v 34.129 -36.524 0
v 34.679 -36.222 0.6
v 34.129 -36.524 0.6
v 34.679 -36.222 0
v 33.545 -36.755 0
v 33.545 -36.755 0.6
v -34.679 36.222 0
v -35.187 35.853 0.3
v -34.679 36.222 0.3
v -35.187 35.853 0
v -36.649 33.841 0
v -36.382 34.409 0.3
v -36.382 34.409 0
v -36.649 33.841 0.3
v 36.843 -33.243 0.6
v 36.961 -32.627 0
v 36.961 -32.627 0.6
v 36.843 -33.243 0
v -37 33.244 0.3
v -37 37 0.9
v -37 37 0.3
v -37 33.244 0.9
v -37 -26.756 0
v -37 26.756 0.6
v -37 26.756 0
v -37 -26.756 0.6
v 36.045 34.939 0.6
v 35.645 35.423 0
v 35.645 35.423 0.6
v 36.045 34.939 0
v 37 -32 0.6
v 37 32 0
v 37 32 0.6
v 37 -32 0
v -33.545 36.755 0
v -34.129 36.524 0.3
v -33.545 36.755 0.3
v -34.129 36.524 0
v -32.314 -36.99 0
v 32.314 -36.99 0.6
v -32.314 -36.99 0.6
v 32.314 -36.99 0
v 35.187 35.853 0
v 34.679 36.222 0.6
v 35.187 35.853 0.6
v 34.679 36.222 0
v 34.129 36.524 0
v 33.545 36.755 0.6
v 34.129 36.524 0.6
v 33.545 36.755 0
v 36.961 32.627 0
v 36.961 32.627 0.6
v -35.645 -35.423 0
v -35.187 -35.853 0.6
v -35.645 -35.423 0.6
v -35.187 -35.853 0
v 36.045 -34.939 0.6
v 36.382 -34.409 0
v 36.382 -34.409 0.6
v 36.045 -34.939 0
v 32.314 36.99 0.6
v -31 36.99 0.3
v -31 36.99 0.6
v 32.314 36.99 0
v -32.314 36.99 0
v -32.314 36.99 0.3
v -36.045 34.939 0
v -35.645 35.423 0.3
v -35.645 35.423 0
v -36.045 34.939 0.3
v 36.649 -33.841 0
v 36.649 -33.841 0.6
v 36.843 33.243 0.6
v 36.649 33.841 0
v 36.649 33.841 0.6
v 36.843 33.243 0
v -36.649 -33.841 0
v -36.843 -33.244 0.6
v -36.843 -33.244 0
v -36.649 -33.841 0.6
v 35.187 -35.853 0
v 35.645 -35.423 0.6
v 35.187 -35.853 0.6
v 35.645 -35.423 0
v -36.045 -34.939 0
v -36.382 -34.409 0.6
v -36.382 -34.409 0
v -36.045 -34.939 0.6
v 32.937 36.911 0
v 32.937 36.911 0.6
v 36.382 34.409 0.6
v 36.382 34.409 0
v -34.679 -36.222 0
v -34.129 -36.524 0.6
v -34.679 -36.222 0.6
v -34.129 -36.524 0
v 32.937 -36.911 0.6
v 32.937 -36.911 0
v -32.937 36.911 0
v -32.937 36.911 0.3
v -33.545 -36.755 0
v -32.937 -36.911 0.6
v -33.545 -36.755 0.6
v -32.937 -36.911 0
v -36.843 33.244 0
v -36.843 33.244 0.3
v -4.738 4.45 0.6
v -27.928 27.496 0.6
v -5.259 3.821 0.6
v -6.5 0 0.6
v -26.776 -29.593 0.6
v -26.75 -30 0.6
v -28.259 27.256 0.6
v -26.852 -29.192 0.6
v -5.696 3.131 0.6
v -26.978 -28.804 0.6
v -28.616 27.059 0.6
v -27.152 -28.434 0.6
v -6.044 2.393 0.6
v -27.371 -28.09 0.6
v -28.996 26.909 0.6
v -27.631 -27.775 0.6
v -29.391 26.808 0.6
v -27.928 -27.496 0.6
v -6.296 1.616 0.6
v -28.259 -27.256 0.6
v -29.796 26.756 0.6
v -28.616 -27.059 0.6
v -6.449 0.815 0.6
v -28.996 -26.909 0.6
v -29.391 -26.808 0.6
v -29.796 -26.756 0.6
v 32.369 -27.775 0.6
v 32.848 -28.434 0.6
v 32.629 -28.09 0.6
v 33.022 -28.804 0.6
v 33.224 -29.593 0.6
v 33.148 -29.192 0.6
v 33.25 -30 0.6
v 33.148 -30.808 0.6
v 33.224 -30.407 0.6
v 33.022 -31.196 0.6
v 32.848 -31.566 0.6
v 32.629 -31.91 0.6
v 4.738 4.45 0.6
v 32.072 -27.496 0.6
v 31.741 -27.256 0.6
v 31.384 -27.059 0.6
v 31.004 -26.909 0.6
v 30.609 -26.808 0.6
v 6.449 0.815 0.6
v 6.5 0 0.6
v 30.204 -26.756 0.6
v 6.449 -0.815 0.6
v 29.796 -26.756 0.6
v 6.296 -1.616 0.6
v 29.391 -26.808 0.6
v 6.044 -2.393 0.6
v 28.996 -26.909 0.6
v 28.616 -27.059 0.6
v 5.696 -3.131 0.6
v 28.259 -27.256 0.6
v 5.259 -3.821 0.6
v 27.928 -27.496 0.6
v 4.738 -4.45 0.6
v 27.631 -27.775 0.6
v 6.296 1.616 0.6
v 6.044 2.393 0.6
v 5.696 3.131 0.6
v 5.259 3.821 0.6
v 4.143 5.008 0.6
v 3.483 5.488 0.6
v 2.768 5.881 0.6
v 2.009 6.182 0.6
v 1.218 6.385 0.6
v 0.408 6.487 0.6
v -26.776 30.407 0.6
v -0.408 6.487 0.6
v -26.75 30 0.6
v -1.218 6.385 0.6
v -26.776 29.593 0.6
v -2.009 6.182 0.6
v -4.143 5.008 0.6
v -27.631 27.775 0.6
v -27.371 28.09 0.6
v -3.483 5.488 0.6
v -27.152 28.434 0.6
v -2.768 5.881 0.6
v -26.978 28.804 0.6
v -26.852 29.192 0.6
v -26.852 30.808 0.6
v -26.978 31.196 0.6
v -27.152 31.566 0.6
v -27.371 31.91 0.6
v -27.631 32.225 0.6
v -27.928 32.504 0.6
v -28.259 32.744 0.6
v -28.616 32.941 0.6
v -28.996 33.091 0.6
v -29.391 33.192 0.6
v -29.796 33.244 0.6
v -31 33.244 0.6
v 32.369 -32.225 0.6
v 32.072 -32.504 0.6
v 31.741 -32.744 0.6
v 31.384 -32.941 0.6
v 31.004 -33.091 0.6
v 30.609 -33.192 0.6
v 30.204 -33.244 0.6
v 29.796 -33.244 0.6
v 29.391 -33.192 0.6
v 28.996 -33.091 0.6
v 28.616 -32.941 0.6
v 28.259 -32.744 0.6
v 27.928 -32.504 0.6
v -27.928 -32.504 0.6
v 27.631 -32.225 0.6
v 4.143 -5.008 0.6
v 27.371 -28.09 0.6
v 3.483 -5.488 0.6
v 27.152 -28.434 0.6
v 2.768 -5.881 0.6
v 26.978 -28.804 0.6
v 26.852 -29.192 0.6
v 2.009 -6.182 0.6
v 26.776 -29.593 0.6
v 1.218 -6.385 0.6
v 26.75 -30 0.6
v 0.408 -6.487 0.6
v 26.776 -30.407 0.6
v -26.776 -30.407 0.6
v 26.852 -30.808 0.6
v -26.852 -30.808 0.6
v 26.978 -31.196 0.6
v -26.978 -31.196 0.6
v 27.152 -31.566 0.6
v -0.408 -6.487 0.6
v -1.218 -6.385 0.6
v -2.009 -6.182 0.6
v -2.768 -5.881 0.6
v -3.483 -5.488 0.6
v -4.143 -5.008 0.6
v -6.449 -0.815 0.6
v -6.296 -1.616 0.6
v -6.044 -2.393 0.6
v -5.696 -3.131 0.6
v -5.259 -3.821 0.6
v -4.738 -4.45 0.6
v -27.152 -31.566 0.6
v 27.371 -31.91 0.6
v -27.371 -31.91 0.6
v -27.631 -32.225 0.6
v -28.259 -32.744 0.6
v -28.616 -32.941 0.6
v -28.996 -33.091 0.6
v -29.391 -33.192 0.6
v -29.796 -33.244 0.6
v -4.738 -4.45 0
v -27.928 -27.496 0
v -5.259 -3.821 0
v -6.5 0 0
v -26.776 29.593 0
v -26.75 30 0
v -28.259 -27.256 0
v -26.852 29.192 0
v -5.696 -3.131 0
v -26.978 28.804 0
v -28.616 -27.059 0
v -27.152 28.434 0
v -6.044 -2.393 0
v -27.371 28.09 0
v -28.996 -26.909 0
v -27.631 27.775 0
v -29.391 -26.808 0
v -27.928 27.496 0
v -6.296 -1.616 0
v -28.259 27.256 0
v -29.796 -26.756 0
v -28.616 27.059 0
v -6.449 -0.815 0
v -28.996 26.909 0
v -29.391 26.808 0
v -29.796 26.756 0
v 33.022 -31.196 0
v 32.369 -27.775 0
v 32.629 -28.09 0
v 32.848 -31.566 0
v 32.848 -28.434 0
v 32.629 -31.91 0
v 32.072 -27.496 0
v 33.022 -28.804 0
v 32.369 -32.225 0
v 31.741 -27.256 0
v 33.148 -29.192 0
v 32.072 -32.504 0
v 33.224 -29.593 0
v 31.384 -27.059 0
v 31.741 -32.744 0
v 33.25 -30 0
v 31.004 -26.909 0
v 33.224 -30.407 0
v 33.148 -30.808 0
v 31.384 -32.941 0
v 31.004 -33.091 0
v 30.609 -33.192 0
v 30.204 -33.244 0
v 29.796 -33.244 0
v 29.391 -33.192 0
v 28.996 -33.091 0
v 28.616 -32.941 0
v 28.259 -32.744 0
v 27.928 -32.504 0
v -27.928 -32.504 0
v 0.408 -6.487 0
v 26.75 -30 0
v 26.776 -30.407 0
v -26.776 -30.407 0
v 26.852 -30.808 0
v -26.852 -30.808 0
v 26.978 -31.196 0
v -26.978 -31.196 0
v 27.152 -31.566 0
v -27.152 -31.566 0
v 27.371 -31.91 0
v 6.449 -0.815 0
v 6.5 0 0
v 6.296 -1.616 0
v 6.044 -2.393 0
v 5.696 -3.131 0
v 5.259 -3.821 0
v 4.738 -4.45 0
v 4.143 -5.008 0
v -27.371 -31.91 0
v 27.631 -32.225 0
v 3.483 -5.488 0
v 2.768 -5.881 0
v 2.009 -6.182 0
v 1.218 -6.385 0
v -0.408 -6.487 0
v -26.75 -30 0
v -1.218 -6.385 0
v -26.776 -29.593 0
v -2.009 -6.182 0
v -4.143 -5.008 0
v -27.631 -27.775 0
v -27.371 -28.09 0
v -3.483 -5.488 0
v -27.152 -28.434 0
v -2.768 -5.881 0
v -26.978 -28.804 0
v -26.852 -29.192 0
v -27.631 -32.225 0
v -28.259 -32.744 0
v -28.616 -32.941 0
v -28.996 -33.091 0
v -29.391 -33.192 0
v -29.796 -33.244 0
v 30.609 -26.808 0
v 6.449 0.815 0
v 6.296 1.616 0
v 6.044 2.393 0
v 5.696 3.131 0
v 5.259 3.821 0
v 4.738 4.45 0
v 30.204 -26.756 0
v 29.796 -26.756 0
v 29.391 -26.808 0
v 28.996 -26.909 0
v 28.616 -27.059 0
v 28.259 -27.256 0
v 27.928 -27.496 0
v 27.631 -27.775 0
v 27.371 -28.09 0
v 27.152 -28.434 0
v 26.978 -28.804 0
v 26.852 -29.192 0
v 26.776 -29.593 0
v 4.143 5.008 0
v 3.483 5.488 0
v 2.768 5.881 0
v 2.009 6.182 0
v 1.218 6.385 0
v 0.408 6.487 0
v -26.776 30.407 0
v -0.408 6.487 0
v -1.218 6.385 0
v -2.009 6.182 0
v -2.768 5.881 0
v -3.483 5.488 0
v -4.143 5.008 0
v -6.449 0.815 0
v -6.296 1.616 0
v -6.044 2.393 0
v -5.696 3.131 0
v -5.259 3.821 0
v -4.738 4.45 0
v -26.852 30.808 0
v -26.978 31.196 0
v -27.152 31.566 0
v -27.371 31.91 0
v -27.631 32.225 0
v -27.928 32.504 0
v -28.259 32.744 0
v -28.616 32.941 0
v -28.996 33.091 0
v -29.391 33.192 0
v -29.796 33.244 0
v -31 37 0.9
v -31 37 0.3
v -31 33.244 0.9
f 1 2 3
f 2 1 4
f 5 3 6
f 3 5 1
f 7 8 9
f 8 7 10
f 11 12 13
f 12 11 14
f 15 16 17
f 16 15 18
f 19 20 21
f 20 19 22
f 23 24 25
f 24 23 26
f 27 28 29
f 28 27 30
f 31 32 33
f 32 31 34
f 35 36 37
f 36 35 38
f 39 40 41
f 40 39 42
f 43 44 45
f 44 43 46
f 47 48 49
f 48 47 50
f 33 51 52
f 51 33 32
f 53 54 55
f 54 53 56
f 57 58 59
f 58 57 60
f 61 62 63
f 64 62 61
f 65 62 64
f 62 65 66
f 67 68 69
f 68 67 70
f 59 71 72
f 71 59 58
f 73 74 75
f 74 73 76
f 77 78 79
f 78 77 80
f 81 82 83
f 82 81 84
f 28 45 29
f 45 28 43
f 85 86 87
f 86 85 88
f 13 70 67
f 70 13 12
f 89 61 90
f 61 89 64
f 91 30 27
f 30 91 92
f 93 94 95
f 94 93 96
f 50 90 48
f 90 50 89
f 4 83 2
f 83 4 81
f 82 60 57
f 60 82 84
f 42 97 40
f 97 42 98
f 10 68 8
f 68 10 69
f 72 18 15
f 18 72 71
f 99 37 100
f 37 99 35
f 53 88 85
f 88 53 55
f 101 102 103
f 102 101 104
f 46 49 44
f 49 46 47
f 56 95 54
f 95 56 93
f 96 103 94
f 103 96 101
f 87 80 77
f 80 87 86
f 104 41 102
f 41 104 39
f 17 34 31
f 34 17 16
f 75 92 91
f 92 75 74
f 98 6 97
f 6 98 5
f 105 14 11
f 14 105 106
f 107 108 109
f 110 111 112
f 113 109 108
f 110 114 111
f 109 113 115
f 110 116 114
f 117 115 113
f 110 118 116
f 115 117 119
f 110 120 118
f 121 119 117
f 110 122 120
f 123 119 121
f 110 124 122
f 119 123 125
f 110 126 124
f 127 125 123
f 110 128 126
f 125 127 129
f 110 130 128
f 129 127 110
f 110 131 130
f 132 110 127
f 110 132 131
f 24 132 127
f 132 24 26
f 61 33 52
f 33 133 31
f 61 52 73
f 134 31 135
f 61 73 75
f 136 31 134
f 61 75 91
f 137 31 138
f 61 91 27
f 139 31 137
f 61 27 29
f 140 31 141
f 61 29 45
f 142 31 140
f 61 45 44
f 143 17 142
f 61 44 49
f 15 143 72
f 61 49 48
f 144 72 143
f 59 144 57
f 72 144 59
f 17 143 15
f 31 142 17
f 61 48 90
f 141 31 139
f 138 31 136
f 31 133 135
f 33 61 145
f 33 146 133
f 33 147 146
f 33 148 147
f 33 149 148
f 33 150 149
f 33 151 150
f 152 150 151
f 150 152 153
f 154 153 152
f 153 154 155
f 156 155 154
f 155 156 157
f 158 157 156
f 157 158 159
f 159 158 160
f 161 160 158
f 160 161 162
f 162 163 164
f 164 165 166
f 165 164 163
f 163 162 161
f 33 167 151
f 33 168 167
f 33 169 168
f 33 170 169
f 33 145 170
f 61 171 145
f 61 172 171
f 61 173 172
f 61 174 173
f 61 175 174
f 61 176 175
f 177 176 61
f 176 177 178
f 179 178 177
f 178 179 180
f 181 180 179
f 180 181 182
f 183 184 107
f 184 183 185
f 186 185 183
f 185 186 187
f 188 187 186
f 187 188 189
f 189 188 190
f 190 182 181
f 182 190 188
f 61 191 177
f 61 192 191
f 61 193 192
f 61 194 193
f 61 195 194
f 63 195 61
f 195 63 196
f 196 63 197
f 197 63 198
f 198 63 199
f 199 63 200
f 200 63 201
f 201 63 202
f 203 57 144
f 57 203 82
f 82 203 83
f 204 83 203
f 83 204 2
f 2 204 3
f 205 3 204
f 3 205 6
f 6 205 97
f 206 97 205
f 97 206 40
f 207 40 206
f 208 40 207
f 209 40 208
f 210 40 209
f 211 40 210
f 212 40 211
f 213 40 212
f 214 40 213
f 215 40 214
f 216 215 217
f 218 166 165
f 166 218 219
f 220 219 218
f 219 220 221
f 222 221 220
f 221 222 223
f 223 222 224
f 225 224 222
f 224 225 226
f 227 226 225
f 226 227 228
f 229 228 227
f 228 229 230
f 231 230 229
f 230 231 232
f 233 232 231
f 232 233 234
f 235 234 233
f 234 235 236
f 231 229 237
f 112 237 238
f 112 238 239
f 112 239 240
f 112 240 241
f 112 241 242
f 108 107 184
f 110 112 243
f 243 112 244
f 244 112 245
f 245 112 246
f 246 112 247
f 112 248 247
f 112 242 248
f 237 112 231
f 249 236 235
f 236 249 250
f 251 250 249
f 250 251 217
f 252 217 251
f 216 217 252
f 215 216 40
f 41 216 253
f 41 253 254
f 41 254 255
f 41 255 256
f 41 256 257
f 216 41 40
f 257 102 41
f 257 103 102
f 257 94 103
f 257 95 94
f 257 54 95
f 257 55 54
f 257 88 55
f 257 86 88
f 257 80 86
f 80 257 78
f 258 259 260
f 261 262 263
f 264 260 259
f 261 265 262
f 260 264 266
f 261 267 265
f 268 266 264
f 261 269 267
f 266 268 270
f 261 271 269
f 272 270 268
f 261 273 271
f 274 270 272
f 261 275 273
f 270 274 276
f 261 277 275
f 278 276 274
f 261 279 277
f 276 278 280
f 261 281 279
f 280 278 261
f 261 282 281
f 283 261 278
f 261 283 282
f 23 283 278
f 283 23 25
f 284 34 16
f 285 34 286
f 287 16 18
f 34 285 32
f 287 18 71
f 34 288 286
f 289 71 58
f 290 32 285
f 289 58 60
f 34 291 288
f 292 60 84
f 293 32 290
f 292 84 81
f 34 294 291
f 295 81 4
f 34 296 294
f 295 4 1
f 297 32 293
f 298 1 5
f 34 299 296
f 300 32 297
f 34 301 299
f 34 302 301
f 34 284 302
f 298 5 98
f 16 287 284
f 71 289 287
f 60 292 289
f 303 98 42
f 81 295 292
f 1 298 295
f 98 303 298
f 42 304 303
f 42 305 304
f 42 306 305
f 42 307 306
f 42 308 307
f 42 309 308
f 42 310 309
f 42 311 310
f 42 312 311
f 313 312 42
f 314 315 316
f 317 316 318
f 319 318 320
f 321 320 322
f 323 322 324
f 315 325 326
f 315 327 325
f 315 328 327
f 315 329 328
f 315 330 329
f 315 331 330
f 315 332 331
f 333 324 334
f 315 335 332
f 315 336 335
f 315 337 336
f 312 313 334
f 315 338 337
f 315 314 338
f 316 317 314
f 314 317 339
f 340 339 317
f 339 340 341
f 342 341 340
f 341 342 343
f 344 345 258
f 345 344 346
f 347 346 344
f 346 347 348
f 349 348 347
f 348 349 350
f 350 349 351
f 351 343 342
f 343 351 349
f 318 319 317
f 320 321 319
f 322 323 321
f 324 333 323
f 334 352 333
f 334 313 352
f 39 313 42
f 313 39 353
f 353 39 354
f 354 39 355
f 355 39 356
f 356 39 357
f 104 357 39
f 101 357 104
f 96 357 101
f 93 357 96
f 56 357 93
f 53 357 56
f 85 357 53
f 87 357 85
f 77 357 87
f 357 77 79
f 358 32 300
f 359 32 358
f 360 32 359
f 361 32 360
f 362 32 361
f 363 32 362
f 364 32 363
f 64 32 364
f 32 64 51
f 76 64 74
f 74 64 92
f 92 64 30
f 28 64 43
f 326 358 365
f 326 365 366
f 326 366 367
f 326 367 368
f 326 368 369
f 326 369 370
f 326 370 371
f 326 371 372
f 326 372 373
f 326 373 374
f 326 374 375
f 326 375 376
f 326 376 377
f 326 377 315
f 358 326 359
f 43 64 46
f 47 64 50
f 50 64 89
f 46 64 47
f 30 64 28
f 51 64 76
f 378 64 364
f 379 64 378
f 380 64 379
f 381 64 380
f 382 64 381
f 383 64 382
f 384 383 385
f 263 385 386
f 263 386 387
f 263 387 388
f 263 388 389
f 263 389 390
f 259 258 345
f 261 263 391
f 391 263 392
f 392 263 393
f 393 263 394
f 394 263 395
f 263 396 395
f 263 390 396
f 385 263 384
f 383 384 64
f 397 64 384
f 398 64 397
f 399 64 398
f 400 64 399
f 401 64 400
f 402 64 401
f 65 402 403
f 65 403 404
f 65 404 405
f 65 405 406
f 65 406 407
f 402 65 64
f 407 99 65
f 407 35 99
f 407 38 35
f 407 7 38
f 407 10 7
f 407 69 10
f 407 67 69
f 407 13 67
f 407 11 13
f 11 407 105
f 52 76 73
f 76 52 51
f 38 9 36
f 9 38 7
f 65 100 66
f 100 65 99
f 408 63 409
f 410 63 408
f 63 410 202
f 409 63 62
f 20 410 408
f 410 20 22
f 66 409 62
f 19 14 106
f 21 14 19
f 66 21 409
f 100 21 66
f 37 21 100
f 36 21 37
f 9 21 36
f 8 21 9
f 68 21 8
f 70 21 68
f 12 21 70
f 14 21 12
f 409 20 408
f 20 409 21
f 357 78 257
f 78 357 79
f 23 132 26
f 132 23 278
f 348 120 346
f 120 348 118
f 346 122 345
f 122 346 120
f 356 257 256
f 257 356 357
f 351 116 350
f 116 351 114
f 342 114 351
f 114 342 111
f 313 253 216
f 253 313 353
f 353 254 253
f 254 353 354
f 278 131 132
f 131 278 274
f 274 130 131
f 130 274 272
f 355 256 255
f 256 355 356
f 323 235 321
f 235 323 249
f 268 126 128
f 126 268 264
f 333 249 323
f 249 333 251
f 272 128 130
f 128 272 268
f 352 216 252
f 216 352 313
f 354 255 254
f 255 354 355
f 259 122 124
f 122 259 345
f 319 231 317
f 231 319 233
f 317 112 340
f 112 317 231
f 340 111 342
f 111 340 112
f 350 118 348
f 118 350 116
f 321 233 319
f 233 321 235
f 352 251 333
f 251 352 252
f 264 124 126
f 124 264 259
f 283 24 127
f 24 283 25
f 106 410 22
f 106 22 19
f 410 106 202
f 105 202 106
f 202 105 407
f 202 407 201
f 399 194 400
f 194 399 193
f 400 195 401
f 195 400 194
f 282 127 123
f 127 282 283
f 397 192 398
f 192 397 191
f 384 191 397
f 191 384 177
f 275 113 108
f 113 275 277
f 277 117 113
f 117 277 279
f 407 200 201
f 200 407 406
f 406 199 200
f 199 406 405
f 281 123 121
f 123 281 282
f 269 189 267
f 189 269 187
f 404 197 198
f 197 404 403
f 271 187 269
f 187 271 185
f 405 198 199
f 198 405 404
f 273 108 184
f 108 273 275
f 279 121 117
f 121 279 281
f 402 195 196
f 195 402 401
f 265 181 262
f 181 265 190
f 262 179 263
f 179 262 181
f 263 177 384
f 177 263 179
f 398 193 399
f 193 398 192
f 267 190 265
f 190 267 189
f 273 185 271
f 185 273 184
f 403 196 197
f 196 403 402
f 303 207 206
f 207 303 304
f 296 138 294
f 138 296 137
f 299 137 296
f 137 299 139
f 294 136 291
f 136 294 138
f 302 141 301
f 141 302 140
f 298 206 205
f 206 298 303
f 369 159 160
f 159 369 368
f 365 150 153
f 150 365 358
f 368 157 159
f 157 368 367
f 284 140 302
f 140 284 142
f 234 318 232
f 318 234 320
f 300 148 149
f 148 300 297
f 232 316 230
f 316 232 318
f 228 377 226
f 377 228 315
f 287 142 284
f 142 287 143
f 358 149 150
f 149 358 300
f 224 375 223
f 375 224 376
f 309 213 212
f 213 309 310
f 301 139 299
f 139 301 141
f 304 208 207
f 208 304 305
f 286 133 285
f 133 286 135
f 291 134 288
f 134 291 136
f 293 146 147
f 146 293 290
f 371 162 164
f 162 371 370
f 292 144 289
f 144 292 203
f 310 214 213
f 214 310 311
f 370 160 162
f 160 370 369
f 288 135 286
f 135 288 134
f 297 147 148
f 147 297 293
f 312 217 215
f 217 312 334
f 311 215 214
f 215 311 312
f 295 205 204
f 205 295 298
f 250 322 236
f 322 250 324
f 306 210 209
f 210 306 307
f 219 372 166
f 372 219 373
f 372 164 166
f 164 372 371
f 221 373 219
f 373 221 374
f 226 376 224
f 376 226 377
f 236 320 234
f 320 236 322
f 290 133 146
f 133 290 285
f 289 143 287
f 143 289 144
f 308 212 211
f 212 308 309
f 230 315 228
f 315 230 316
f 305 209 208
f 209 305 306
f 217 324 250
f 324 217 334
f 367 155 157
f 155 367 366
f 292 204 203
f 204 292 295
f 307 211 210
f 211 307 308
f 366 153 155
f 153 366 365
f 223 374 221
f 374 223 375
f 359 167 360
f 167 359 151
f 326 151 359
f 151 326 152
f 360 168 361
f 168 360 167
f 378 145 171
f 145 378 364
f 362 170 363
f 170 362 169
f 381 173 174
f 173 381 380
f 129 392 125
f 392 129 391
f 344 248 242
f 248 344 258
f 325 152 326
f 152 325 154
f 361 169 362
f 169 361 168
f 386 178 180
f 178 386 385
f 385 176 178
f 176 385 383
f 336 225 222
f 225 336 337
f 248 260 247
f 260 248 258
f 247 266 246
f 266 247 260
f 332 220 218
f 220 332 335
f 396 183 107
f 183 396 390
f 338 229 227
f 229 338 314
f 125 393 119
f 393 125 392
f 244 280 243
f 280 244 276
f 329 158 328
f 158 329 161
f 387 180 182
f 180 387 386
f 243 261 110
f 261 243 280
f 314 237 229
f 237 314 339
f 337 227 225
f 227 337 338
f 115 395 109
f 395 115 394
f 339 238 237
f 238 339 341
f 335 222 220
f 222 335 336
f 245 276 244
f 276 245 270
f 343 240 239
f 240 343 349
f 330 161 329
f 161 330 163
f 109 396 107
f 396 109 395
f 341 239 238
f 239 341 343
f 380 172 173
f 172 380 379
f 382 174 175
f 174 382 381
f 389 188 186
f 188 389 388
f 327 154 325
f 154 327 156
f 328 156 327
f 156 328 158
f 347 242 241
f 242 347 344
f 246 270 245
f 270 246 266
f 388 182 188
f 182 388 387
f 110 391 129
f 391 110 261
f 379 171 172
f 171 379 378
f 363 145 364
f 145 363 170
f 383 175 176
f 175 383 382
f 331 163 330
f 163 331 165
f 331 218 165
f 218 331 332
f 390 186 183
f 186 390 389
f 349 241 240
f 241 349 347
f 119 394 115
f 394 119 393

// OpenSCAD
$fn = 50;


difference() {
	union() {
		translate(v = [0, 0, 0]) {
			rotate(a = [0, 0, 0]) {
				hull() {
					translate(v = [-32.0000000000, 32.0000000000, 0]) {
						rotate(a = [0, 0, 0]) {
							translate(v = [0, 0, 0]) {
								rotate(a = [0, 0, 0]) {
									cylinder(h = 0.6000000000, r = 5);
								}
							}
						}
					}
					translate(v = [32.0000000000, 32.0000000000, 0]) {
						rotate(a = [0, 0, 0]) {
							translate(v = [0, 0, 0]) {
								rotate(a = [0, 0, 0]) {
									cylinder(h = 0.6000000000, r = 5);
								}
							}
						}
					}
					translate(v = [-32.0000000000, -32.0000000000, 0]) {
						rotate(a = [0, 0, 0]) {
							translate(v = [0, 0, 0]) {
								rotate(a = [0, 0, 0]) {
									cylinder(h = 0.6000000000, r = 5);
								}
							}
						}
					}
					translate(v = [32.0000000000, -32.0000000000, 0]) {
						rotate(a = [0, 0, 0]) {
							translate(v = [0, 0, 0]) {
								rotate(a = [0, 0, 0]) {
									cylinder(h = 0.6000000000, r = 5);
								}
							}
						}
					}
				}
			}
		}
		#translate(v = [-37.0000000000, 31.0000000000, 0.3000000000]) {
			rotate(a = [0, 0, 0]) {
				cube(size = [6, 6, 0.6000000000]);
			}
		}
	}
	union() {
		translate(v = [-37.5000000000, -30.0000000000, -125]) {
			rotate(a = [0, 0, 0]) {
				hull() {
					translate(v = [7.5000000000, 0, 0]) {
						rotate(a = [0, 0, 0]) {
							translate(v = [0, 0, 0]) {
								rotate(a = [0, 0, 0]) {
									cylinder(h = 250, r = 3.2500000000);
								}
							}
						}
					}
					translate(v = [-7.5000000000, 0, 0]) {
						rotate(a = [0, 0, 0]) {
							translate(v = [0, 0, 0]) {
								rotate(a = [0, 0, 0]) {
									cylinder(h = 250, r = 3.2500000000);
								}
							}
						}
					}
				}
			}
		}
		translate(v = [-37.5000000000, 30.0000000000, -125]) {
			rotate(a = [0, 0, 0]) {
				hull() {
					translate(v = [7.5000000000, 0, 0]) {
						rotate(a = [0, 0, 0]) {
							translate(v = [0, 0, 0]) {
								rotate(a = [0, 0, 0]) {
									cylinder(h = 250, r = 3.2500000000);
								}
							}
						}
					}
					translate(v = [-7.5000000000, 0, 0]) {
						rotate(a = [0, 0, 0]) {
							translate(v = [0, 0, 0]) {
								rotate(a = [0, 0, 0]) {
									cylinder(h = 250, r = 3.2500000000);
								}
							}
						}
					}
				}
			}
		}
		translate(v = [30.0000000000, -30.0000000000, -125.0000000000]) {
			rotate(a = [0, 0, 0]) {
				cylinder(h = 250, r = 3.2500000000);
			}
		}
		translate(v = [0, 0, 0.0000000000]) {
			rotate(a = [0, 0, 0]) {
				cylinder(h = 0.6000000000, r = 6.5000000000);
			}
		}
	}
}
